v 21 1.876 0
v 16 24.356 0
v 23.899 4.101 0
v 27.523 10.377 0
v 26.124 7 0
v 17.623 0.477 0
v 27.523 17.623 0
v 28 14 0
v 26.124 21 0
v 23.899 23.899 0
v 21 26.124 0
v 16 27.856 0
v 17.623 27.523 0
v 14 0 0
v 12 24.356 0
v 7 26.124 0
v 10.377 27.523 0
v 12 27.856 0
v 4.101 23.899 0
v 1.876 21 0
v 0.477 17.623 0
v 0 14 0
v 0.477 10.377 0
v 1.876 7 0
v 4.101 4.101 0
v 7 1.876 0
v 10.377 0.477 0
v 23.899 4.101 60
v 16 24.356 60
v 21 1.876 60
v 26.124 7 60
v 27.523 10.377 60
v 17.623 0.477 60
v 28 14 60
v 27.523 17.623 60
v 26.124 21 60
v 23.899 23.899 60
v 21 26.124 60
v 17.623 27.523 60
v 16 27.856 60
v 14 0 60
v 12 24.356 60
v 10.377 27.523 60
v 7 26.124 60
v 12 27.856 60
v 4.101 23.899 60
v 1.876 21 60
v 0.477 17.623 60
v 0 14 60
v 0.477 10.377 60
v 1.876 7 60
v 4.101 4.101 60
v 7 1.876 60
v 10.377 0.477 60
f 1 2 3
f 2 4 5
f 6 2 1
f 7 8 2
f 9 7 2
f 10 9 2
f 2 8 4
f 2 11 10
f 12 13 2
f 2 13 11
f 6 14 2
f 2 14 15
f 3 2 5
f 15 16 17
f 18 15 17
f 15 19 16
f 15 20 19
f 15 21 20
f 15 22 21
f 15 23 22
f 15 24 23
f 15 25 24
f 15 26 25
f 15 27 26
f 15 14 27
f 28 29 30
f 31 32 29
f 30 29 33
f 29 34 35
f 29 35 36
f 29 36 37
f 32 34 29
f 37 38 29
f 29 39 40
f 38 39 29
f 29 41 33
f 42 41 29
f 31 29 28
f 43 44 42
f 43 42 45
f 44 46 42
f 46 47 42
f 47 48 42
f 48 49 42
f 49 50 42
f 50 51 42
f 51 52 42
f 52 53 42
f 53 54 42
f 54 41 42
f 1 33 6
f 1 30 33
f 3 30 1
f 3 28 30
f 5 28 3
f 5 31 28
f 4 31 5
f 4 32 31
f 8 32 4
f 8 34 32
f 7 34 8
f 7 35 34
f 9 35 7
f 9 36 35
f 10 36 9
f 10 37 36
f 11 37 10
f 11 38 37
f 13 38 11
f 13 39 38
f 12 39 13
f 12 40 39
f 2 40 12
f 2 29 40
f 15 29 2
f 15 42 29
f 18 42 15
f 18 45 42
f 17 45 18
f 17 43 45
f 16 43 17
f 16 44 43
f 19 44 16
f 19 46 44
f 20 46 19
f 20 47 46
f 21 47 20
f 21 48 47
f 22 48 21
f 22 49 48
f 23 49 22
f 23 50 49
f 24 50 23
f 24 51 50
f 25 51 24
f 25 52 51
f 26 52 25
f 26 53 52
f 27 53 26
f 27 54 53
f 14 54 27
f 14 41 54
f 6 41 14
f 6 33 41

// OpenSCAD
$fn = 32;

// ----------------------------------------------------------------------
// Keyway shaft: d28 shaft, key 4 x 3.5 mm
// ----------------------------------------------------------------------

// --- parameters (mm) ---
shaft_r = 14;             // shaft radius
key_w = 4;                // keyway width
key_d = 3.5;              // keyway depth below the surface line
plate_t = 60;             // shaft length, Z (extrusion height)
fit_tol = 0.1;            // declared fit tolerance (prompt contract)
free_tol = 0.5;           // declared free tolerance (prompt contract)

shaft_d = 2 * shaft_r;  // shaft diameter
circle_step = 15;  // polygon sampling step, degrees

profile = [[10.377, 27.523], [7, 26.124], [4.101, 23.899], [1.876, 21], [0.477, 17.623], [0, 14], [0.477, 10.377], [1.876, 7], [4.101, 4.101], [7, 1.876], [10.377, 0.477], [14, 0], [17.623, 0.477], [21, 1.876], [23.899, 4.101], [26.124, 7], [27.523, 10.377], [28, 14], [27.523, 17.623], [26.124, 21], [23.899, 23.899], [21, 26.124], [17.623, 27.523], [16, 27.856], [16, 24.356], [12, 24.356], [12, 27.856]];  // primary outline, 27 points, counter clockwise

// --- the one profile operation ---
linear_extrude(height = plate_t) polygon(points = profile);
